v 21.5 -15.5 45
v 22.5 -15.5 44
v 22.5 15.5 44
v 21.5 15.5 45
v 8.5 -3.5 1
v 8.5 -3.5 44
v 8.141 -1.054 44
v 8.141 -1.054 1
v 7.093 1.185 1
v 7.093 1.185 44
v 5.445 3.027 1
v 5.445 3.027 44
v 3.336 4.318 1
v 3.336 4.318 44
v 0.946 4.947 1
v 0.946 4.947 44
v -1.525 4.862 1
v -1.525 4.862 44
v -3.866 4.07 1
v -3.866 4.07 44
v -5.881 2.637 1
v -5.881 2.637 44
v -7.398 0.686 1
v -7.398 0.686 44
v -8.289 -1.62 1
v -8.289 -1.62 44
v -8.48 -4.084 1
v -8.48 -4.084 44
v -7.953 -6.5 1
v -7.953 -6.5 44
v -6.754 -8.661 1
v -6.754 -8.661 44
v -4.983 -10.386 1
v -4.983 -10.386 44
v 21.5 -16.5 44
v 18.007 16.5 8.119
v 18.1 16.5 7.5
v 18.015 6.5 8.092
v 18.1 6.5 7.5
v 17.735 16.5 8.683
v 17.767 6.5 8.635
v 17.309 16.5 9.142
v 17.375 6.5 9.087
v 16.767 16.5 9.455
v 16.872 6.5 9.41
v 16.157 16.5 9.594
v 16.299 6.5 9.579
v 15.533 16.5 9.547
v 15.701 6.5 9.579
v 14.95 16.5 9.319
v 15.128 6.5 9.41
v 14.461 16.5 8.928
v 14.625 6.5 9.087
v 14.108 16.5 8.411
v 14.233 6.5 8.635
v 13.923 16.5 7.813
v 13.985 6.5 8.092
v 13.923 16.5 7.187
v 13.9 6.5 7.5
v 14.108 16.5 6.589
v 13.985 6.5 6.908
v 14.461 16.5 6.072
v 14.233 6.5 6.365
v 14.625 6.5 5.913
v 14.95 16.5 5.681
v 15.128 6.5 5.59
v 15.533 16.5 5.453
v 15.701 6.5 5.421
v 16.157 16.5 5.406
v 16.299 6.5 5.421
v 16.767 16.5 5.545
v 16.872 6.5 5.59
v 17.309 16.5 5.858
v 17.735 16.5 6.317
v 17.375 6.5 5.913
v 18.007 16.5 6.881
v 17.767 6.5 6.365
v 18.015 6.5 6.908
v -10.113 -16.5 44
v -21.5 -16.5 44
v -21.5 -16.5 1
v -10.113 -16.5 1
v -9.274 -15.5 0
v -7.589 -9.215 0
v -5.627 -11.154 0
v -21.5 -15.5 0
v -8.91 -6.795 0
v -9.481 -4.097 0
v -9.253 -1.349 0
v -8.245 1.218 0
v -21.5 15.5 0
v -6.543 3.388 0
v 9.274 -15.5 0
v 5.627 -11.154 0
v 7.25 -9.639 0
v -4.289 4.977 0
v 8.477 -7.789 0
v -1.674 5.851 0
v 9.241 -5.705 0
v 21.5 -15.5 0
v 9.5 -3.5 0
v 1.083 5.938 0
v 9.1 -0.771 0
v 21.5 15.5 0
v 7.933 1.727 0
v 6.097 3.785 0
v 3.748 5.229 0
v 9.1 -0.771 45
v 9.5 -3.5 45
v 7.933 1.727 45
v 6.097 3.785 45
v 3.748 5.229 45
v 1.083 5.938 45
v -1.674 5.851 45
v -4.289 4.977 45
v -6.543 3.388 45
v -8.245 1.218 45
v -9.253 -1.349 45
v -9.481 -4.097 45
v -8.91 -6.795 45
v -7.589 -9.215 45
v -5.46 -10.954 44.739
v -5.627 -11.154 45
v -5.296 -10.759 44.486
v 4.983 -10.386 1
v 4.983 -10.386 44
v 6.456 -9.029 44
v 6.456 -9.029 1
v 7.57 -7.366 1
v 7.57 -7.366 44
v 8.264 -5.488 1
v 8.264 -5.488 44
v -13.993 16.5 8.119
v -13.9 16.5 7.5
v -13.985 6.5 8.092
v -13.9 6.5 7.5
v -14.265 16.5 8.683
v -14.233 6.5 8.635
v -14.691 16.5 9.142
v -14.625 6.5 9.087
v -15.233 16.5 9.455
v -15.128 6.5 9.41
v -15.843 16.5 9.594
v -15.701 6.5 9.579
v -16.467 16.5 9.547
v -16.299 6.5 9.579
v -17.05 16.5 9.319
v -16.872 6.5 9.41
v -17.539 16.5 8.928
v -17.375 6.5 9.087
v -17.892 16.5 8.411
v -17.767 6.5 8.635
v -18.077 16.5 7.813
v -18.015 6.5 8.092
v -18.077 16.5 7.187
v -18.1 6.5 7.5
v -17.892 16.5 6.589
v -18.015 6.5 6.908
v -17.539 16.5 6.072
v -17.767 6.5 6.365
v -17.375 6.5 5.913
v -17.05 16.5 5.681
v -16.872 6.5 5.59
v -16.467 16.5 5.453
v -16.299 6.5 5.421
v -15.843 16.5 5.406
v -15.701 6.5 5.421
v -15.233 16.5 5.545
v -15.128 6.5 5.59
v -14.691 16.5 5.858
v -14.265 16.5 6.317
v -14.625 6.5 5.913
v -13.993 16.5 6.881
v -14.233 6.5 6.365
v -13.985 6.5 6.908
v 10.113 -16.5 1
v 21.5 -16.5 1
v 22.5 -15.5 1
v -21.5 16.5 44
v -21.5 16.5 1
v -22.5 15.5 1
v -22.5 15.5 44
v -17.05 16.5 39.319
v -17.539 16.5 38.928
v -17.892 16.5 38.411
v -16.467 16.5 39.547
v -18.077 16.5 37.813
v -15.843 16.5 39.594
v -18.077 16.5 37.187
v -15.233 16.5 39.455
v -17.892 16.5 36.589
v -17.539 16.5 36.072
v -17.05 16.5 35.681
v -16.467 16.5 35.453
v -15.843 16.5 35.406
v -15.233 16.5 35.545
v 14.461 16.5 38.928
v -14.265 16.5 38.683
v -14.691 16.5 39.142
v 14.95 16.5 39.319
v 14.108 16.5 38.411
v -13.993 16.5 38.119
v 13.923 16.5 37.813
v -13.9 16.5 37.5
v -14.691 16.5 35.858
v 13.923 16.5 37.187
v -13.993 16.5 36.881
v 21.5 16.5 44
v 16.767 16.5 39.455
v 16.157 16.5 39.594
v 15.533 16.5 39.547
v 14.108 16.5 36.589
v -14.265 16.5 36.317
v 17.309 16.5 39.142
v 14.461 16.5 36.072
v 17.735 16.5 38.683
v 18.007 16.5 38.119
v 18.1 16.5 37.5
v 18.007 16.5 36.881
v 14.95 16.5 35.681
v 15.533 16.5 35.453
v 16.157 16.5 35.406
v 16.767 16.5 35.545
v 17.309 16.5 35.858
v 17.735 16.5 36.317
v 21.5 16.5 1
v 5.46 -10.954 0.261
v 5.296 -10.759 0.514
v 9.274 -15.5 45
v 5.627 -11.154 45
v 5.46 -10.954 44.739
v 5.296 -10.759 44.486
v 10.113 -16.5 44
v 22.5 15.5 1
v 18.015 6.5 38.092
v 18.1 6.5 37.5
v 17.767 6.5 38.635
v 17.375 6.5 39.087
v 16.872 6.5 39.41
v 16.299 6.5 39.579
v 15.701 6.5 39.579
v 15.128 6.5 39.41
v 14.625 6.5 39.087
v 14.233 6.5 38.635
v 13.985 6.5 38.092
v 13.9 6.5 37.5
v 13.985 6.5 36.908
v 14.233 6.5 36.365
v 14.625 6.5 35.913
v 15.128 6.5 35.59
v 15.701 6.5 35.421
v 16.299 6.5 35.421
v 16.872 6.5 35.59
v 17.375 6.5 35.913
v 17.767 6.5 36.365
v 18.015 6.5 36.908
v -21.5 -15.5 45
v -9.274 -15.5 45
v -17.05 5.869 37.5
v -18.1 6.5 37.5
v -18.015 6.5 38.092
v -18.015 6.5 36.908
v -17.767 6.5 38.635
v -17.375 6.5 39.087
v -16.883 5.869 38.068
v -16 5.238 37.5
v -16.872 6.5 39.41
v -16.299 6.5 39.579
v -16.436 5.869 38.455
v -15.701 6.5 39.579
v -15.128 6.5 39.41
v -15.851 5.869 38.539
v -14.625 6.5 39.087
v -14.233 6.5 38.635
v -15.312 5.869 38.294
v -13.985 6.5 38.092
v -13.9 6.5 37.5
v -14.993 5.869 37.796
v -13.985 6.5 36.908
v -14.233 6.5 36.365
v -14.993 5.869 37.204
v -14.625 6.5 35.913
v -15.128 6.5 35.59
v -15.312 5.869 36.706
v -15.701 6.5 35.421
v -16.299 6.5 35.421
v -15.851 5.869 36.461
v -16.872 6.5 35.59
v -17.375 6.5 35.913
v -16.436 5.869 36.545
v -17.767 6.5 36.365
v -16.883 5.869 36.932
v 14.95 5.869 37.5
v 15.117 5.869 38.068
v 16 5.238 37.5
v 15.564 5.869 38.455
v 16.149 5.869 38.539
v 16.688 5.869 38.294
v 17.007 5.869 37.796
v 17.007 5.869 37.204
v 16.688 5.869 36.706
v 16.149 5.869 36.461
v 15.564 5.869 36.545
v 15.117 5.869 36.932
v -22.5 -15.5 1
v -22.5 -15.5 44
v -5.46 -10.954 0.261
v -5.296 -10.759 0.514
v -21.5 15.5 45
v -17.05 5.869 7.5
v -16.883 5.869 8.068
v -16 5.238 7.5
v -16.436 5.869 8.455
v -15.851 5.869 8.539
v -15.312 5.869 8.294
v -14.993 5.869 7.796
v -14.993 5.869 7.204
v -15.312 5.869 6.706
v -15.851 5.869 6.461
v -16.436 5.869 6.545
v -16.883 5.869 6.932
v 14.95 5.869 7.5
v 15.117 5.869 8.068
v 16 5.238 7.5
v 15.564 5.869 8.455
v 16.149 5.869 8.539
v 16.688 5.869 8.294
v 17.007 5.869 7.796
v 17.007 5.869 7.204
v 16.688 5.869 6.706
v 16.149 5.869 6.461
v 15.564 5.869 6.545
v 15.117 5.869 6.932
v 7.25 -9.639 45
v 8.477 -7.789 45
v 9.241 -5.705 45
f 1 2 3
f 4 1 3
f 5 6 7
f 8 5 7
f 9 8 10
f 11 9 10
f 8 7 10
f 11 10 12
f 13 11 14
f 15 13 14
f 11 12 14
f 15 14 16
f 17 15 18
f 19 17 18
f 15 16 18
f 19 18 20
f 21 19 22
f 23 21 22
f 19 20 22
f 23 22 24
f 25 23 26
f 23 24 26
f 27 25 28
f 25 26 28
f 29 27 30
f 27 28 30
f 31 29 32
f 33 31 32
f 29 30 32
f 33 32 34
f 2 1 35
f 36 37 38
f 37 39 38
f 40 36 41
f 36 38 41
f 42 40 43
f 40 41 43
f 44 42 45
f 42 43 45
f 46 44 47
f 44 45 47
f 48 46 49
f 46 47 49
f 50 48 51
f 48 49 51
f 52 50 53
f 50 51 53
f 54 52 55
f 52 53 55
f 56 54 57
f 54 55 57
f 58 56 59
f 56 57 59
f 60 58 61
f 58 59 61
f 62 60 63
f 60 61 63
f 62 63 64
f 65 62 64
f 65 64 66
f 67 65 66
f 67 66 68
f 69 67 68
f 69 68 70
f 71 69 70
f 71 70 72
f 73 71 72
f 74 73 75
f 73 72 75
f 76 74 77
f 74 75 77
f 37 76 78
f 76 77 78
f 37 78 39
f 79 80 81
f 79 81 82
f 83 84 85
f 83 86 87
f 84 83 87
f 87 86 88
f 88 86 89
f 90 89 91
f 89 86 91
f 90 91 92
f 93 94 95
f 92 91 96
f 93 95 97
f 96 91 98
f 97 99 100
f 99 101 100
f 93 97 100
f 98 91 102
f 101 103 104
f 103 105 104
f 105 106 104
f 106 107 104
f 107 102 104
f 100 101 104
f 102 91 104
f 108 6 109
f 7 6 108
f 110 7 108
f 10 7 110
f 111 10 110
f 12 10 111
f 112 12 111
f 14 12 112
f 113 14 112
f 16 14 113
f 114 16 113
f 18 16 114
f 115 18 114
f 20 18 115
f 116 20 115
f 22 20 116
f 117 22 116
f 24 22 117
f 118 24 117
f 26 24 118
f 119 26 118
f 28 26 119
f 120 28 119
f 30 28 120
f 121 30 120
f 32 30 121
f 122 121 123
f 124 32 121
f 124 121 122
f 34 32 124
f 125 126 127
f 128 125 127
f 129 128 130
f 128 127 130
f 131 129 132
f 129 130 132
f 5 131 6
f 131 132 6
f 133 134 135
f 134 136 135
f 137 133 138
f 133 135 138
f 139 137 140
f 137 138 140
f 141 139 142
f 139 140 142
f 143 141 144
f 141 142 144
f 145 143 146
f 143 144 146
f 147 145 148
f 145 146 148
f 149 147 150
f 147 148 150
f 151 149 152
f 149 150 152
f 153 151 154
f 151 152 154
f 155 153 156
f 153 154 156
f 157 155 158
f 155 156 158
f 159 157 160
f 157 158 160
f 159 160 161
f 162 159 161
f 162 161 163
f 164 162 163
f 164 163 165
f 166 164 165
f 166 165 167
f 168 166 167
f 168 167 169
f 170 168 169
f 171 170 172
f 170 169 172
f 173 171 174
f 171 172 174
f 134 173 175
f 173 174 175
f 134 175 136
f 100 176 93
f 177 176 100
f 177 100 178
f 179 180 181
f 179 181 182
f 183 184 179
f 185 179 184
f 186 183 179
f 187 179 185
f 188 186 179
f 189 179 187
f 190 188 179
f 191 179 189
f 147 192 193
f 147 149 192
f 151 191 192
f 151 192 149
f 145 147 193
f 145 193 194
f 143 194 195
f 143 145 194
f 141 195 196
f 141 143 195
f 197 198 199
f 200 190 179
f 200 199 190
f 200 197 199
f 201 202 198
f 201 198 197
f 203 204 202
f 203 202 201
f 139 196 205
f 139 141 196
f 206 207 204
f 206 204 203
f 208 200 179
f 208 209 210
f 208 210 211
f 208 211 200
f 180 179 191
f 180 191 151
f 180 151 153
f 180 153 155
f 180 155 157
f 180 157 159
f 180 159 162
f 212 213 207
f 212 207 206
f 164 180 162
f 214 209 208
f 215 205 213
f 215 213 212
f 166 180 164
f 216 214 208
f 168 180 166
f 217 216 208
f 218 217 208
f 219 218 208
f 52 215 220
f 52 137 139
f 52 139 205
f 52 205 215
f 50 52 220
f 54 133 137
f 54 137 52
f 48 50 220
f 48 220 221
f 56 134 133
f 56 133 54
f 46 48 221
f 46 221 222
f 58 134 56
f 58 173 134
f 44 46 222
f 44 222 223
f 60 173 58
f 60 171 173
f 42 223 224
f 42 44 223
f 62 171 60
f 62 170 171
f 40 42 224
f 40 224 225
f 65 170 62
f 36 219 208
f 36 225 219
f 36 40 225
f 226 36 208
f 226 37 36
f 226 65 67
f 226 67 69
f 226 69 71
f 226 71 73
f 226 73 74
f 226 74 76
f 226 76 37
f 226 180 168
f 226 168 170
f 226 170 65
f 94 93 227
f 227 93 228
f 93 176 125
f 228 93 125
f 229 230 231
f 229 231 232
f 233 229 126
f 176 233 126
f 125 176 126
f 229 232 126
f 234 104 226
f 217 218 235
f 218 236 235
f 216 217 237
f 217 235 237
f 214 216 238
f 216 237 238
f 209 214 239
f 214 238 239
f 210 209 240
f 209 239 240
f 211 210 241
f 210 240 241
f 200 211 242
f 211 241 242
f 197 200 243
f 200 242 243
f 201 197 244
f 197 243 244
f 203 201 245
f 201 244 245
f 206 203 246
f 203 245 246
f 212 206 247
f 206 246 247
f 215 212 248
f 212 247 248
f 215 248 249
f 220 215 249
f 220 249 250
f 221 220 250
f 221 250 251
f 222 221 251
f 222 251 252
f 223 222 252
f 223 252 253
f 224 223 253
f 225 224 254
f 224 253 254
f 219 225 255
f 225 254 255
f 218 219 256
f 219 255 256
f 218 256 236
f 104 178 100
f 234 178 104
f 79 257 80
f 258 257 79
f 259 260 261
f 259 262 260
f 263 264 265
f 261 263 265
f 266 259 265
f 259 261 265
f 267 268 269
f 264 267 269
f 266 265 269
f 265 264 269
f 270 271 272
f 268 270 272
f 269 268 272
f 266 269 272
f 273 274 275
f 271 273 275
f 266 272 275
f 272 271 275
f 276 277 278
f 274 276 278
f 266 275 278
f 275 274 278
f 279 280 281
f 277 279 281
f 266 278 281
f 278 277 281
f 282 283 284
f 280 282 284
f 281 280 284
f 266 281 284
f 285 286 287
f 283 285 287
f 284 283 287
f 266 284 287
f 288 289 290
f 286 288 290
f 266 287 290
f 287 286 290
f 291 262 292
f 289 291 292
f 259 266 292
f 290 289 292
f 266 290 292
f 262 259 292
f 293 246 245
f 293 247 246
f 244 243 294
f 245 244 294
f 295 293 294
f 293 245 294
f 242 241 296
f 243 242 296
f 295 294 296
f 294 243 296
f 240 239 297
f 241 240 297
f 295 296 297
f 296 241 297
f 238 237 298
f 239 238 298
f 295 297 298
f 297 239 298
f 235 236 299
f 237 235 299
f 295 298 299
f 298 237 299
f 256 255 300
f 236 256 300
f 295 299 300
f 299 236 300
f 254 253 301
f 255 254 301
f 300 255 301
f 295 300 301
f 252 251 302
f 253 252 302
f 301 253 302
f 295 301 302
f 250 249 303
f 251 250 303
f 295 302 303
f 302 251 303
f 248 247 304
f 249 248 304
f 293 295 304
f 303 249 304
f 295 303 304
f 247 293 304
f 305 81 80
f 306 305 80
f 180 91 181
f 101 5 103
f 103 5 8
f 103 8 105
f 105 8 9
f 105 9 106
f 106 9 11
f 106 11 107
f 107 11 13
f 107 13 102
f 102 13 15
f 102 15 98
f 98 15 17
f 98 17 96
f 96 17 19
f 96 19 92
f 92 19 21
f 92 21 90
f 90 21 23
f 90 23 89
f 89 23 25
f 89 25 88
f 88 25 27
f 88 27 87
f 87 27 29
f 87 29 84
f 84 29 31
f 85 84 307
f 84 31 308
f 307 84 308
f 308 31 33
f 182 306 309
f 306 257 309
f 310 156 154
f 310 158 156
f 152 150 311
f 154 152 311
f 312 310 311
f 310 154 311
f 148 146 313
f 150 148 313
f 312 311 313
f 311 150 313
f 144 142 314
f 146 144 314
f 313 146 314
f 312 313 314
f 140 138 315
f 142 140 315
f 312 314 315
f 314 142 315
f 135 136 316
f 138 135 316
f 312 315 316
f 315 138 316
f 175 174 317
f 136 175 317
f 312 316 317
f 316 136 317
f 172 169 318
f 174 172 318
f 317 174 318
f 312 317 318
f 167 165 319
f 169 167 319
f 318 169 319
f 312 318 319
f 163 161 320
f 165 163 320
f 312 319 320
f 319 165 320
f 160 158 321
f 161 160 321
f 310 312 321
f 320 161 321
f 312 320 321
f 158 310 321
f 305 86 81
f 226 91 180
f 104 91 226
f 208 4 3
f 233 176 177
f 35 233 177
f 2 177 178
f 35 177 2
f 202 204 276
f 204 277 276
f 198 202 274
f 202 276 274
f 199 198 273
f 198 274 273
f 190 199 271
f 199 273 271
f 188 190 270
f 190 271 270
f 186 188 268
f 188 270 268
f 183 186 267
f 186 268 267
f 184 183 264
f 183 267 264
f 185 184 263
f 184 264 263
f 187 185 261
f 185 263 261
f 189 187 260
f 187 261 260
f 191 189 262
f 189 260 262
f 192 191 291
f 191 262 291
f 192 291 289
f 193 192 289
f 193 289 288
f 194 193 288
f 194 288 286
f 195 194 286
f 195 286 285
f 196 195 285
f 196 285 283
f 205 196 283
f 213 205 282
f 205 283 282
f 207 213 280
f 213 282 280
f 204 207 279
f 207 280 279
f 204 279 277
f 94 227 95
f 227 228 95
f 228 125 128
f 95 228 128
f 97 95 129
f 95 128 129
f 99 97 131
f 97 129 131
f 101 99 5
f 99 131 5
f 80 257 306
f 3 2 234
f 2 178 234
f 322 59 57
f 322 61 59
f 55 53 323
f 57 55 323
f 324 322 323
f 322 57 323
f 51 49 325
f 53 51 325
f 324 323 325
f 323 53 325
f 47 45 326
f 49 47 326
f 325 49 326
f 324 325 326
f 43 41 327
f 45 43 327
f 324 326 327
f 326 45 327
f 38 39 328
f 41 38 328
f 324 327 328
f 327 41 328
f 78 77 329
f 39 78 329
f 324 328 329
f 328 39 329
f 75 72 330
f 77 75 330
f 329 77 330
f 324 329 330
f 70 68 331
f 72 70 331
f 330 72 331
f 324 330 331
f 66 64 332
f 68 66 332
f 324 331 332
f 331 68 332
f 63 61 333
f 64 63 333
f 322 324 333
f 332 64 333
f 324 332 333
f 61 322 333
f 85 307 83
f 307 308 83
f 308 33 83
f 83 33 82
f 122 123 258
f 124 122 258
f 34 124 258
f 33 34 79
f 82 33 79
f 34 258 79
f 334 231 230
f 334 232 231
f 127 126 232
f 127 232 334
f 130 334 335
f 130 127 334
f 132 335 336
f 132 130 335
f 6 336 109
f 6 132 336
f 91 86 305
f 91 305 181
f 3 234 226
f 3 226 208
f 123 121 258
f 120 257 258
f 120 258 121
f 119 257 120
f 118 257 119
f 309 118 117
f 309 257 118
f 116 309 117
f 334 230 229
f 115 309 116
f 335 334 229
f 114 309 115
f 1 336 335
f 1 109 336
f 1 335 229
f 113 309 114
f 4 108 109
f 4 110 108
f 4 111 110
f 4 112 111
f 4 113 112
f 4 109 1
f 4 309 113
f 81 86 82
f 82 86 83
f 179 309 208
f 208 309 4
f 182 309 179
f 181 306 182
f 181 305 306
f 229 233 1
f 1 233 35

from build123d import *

# Parameters (mm, degrees)
SKETCH1_W             = 45
SKETCH1_H             = 33
EXTRUDE1_DEPTH        = 45
EXTRUDE3_DEPTH        = 53.948087784
M5_TAPPED_HOLE1_D     = 4.2
M5_TAPPED_HOLE1_DEPTH = 10
M5_TAPPED_HOLE1_TIP   = 1.2618073
CHAMFER1_SIZE         = 1


with BuildPart() as part:
    # Sketch1 → Extrude1 (new body)
    with BuildSketch(Plane.XY):
        Rectangle(SKETCH1_W, SKETCH1_H)
    extrude(amount=EXTRUDE1_DEPTH)

    # Sketch2 → Extrude3 (cut, through all)
    with BuildSketch(Plane.XY.offset(45)):
        with BuildLine():
            Line((4.983173546, -10.386071552), (0, -4.447356576))
            Line((0, -4.447356576), (-4.983173546, -10.386071552))
            ThreePointArc((-4.983173546, -10.386071552), (0, -12), (4.983173546, -10.386071552))
        make_face()
        with BuildLine():
            Line((-4.983173546, -10.386071552), (0, -4.447356576))
            Line((0, -4.447356576), (4.983173546, -10.386071552))
            ThreePointArc((4.983173546, -10.386071552), (7.569906708, -7.366071964), (8.5, -3.5))
            ThreePointArc((8.5, -3.5), (-3.866071964, 4.069906708), (-4.983173546, -10.386071552))
        make_face()
        Polygon((10.113368652, -16.5), (-10.113368652, -16.5), (-13.53955506, -20.583169961), (13.53955506, -20.583169961), align=None)
        with BuildLine():
            ThreePointArc((4.983173546, -10.386071552), (0, -12), (-4.983173546, -10.386071552))
            Line((-4.983173546, -10.386071552), (-10.113368652, -16.5))
            Line((-10.113368652, -16.5), (10.113368652, -16.5))
            Line((10.113368652, -16.5), (4.983173546, -10.386071552))
        make_face()
    extrude(amount=-EXTRUDE3_DEPTH, mode=Mode.SUBTRACT)

    # M5 Tapped Hole1
    with Locations(Plane(origin=(0, 16.5, 0), x_dir=(-1, 0, 0), z_dir=(0, 1, 0))):
        with Locations((16, 7.5), (-16, 7.5), (-16, 37.5), (16, 37.5)):
            Hole(M5_TAPPED_HOLE1_D / 2, depth=M5_TAPPED_HOLE1_DEPTH)
            with Locations((0, 0, -(M5_TAPPED_HOLE1_DEPTH + M5_TAPPED_HOLE1_TIP / 2))):  # 118° drill point
                Cone(0, M5_TAPPED_HOLE1_D / 2, M5_TAPPED_HOLE1_TIP, mode=Mode.SUBTRACT)

    # Chamfer1
    chamfer1_edges = [part.edges().sort_by_distance(p)[0] for p in [
        (-22.5, 0, 45),
        (-16.306684326, -16.5, 45),
        (16.306684326, -16.5, 0),
        (16.306684326, -16.5, 45),
        (0, 5, 45),
        (0, 5, 0),
        (22.5, 0, 45),
        (-16.306684326, -16.5, 0),
        (-22.5, 0, 0),
        (0, 16.5, 0),
        (22.5, 0, 0),
        (0, 16.5, 45),
        (22.5, -16.5, 22.5),
        (-22.5, -16.5, 22.5),
        (-22.5, 16.5, 22.5),
        (22.5, 16.5, 22.5),
    ]]
    chamfer(chamfer1_edges, length=CHAMFER1_SIZE)


solid = part.part
